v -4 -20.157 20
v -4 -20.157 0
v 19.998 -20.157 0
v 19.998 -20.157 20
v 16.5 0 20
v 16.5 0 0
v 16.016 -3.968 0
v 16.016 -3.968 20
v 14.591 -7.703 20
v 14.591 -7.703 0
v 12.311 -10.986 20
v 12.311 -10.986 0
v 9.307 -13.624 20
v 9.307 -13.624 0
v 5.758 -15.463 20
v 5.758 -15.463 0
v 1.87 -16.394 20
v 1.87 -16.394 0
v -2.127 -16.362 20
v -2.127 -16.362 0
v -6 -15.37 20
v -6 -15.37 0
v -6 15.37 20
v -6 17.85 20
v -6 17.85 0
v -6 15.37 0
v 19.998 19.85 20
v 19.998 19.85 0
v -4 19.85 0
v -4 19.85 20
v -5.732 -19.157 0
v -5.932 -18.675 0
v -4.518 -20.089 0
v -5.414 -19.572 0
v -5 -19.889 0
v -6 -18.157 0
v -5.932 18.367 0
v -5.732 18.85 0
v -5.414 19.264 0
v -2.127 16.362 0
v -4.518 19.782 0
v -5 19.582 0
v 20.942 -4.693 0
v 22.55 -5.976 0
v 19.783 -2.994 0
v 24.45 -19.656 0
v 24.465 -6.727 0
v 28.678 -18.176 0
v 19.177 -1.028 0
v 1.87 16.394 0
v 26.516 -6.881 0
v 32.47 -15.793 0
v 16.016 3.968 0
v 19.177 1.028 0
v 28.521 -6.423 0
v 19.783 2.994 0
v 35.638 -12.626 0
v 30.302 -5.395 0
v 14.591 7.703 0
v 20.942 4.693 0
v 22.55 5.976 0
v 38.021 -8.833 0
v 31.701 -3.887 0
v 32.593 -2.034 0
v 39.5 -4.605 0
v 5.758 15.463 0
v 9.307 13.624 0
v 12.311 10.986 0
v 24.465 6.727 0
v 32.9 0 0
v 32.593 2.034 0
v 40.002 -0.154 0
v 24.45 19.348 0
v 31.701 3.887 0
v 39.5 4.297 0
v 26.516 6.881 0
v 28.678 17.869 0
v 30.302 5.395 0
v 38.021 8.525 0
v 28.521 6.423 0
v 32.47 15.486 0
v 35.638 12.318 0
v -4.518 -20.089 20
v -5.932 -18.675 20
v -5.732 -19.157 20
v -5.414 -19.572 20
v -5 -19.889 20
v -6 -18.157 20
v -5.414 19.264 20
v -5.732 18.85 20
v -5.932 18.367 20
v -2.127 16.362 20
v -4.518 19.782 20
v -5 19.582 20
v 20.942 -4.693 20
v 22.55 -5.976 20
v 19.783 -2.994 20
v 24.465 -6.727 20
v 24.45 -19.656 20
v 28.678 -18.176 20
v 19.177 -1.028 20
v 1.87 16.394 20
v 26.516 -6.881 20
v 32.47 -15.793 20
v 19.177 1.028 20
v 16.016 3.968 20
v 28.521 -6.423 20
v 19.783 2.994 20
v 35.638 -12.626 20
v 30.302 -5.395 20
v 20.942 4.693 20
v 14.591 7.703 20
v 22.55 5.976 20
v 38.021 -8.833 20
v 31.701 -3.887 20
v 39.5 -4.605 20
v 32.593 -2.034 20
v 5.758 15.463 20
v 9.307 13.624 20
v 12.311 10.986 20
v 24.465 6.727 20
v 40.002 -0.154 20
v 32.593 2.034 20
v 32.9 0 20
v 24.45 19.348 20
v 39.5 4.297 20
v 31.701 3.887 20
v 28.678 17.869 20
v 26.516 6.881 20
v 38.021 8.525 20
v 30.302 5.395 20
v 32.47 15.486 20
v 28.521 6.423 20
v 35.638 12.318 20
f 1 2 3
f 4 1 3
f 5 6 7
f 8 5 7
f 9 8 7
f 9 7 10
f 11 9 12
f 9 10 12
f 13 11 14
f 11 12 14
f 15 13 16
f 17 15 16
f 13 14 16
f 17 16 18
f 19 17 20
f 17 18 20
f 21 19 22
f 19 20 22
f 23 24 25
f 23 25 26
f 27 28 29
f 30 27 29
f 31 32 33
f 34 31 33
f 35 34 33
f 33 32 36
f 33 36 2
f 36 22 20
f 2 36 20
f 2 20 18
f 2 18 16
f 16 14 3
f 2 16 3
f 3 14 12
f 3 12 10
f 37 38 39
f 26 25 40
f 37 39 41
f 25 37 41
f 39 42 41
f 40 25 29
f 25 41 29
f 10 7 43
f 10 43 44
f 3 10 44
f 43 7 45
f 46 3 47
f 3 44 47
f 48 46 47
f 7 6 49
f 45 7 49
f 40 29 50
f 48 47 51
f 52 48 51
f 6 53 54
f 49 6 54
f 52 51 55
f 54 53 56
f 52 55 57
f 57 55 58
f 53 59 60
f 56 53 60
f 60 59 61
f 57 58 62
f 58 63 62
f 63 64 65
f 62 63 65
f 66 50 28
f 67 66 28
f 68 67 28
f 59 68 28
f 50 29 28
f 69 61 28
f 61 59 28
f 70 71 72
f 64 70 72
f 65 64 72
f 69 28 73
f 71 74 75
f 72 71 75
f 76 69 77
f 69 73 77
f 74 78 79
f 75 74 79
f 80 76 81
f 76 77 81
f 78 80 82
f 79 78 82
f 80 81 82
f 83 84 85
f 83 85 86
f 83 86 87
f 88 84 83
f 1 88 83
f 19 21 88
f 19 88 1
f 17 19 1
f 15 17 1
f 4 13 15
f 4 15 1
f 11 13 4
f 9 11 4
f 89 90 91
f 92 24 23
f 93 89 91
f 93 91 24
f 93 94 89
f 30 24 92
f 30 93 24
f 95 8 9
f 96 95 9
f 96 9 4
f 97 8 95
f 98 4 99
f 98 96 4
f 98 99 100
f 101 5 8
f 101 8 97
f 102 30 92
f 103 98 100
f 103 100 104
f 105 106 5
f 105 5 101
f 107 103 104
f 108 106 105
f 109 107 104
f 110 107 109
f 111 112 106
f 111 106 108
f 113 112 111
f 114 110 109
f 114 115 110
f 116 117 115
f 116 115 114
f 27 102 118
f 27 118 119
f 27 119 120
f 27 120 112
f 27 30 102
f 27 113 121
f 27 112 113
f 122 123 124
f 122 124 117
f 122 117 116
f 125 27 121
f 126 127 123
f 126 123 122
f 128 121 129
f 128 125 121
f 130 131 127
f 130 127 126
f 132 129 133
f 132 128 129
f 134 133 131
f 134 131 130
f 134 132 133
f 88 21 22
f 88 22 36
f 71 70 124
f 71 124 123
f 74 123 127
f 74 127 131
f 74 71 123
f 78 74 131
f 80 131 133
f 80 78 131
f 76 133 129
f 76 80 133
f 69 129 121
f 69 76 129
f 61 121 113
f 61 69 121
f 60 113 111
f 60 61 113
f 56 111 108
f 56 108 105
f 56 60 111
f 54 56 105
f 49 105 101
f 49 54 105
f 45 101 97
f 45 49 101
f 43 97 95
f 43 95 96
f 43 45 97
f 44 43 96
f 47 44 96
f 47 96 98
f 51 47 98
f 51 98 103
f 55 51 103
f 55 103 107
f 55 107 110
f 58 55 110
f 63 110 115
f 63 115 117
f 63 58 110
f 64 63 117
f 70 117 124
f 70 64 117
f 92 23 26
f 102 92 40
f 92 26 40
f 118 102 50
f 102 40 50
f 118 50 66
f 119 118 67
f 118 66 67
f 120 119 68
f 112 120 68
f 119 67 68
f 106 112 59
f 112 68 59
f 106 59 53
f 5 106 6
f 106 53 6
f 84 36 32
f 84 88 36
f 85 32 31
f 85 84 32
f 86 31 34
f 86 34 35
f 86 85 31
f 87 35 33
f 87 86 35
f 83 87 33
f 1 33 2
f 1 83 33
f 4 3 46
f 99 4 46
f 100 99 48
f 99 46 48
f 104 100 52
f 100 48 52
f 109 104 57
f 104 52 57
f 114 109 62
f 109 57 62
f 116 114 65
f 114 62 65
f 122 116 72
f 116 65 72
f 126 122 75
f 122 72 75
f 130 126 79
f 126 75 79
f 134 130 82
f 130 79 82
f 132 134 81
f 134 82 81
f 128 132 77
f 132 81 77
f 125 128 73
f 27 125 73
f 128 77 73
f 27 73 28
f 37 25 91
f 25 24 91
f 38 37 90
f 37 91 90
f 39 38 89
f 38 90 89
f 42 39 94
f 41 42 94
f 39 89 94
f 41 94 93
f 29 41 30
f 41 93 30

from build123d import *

# Parameters (mm, degrees)
F0_R     = 6.9
F1_DEPTH = 20
F3_R     = 2


# Not quite as in the source:
# - a feature of the source that left no trace in its solid (it failed there, or was rolled back) is left out


with BuildPart() as f1:
    # F0 (on Top) → F1 (new body)
    with BuildSketch(Plane.XY):
        with BuildLine():
            ThreePointArc((-6, 15.3704261489), (9.3072552345, 13.6244265934), (16.5, 0))
            ThreePointArc((16.5, 0), (9.3072552345, -13.6244265934), (-6, -15.3704261489))
            Line((-6, -15.3704261489), (-6, -20.1503510079))
            Line((-6, -20.1503510079), (-6, -20.1573419994))
            Line((-6, -20.1573419994), (19.9984760751, -20.1573419994))
            ThreePointArc((19.9984760751, -20.1573419994), (40.0019715709, -0.1538465036), (19.9984760751, 19.8496489921))
            Line((19.9984760751, 19.8496489921), (-6, 19.8496489921))
            Line((-6, 19.8496489921), (-6, 15.3704261489))
        make_face()
        with Locations((26, 0)):
            Circle(F0_R, mode=Mode.SUBTRACT)
    extrude(amount=F1_DEPTH)

    # F3
    f3_edges = [f1.edges().sort_by_distance(p)[0] for p in [
        (-6, -20.157342, 10),
        (-6, 19.849649, 10),
    ]]
    fillet(f3_edges, radius=F3_R)


solid = f1.part
